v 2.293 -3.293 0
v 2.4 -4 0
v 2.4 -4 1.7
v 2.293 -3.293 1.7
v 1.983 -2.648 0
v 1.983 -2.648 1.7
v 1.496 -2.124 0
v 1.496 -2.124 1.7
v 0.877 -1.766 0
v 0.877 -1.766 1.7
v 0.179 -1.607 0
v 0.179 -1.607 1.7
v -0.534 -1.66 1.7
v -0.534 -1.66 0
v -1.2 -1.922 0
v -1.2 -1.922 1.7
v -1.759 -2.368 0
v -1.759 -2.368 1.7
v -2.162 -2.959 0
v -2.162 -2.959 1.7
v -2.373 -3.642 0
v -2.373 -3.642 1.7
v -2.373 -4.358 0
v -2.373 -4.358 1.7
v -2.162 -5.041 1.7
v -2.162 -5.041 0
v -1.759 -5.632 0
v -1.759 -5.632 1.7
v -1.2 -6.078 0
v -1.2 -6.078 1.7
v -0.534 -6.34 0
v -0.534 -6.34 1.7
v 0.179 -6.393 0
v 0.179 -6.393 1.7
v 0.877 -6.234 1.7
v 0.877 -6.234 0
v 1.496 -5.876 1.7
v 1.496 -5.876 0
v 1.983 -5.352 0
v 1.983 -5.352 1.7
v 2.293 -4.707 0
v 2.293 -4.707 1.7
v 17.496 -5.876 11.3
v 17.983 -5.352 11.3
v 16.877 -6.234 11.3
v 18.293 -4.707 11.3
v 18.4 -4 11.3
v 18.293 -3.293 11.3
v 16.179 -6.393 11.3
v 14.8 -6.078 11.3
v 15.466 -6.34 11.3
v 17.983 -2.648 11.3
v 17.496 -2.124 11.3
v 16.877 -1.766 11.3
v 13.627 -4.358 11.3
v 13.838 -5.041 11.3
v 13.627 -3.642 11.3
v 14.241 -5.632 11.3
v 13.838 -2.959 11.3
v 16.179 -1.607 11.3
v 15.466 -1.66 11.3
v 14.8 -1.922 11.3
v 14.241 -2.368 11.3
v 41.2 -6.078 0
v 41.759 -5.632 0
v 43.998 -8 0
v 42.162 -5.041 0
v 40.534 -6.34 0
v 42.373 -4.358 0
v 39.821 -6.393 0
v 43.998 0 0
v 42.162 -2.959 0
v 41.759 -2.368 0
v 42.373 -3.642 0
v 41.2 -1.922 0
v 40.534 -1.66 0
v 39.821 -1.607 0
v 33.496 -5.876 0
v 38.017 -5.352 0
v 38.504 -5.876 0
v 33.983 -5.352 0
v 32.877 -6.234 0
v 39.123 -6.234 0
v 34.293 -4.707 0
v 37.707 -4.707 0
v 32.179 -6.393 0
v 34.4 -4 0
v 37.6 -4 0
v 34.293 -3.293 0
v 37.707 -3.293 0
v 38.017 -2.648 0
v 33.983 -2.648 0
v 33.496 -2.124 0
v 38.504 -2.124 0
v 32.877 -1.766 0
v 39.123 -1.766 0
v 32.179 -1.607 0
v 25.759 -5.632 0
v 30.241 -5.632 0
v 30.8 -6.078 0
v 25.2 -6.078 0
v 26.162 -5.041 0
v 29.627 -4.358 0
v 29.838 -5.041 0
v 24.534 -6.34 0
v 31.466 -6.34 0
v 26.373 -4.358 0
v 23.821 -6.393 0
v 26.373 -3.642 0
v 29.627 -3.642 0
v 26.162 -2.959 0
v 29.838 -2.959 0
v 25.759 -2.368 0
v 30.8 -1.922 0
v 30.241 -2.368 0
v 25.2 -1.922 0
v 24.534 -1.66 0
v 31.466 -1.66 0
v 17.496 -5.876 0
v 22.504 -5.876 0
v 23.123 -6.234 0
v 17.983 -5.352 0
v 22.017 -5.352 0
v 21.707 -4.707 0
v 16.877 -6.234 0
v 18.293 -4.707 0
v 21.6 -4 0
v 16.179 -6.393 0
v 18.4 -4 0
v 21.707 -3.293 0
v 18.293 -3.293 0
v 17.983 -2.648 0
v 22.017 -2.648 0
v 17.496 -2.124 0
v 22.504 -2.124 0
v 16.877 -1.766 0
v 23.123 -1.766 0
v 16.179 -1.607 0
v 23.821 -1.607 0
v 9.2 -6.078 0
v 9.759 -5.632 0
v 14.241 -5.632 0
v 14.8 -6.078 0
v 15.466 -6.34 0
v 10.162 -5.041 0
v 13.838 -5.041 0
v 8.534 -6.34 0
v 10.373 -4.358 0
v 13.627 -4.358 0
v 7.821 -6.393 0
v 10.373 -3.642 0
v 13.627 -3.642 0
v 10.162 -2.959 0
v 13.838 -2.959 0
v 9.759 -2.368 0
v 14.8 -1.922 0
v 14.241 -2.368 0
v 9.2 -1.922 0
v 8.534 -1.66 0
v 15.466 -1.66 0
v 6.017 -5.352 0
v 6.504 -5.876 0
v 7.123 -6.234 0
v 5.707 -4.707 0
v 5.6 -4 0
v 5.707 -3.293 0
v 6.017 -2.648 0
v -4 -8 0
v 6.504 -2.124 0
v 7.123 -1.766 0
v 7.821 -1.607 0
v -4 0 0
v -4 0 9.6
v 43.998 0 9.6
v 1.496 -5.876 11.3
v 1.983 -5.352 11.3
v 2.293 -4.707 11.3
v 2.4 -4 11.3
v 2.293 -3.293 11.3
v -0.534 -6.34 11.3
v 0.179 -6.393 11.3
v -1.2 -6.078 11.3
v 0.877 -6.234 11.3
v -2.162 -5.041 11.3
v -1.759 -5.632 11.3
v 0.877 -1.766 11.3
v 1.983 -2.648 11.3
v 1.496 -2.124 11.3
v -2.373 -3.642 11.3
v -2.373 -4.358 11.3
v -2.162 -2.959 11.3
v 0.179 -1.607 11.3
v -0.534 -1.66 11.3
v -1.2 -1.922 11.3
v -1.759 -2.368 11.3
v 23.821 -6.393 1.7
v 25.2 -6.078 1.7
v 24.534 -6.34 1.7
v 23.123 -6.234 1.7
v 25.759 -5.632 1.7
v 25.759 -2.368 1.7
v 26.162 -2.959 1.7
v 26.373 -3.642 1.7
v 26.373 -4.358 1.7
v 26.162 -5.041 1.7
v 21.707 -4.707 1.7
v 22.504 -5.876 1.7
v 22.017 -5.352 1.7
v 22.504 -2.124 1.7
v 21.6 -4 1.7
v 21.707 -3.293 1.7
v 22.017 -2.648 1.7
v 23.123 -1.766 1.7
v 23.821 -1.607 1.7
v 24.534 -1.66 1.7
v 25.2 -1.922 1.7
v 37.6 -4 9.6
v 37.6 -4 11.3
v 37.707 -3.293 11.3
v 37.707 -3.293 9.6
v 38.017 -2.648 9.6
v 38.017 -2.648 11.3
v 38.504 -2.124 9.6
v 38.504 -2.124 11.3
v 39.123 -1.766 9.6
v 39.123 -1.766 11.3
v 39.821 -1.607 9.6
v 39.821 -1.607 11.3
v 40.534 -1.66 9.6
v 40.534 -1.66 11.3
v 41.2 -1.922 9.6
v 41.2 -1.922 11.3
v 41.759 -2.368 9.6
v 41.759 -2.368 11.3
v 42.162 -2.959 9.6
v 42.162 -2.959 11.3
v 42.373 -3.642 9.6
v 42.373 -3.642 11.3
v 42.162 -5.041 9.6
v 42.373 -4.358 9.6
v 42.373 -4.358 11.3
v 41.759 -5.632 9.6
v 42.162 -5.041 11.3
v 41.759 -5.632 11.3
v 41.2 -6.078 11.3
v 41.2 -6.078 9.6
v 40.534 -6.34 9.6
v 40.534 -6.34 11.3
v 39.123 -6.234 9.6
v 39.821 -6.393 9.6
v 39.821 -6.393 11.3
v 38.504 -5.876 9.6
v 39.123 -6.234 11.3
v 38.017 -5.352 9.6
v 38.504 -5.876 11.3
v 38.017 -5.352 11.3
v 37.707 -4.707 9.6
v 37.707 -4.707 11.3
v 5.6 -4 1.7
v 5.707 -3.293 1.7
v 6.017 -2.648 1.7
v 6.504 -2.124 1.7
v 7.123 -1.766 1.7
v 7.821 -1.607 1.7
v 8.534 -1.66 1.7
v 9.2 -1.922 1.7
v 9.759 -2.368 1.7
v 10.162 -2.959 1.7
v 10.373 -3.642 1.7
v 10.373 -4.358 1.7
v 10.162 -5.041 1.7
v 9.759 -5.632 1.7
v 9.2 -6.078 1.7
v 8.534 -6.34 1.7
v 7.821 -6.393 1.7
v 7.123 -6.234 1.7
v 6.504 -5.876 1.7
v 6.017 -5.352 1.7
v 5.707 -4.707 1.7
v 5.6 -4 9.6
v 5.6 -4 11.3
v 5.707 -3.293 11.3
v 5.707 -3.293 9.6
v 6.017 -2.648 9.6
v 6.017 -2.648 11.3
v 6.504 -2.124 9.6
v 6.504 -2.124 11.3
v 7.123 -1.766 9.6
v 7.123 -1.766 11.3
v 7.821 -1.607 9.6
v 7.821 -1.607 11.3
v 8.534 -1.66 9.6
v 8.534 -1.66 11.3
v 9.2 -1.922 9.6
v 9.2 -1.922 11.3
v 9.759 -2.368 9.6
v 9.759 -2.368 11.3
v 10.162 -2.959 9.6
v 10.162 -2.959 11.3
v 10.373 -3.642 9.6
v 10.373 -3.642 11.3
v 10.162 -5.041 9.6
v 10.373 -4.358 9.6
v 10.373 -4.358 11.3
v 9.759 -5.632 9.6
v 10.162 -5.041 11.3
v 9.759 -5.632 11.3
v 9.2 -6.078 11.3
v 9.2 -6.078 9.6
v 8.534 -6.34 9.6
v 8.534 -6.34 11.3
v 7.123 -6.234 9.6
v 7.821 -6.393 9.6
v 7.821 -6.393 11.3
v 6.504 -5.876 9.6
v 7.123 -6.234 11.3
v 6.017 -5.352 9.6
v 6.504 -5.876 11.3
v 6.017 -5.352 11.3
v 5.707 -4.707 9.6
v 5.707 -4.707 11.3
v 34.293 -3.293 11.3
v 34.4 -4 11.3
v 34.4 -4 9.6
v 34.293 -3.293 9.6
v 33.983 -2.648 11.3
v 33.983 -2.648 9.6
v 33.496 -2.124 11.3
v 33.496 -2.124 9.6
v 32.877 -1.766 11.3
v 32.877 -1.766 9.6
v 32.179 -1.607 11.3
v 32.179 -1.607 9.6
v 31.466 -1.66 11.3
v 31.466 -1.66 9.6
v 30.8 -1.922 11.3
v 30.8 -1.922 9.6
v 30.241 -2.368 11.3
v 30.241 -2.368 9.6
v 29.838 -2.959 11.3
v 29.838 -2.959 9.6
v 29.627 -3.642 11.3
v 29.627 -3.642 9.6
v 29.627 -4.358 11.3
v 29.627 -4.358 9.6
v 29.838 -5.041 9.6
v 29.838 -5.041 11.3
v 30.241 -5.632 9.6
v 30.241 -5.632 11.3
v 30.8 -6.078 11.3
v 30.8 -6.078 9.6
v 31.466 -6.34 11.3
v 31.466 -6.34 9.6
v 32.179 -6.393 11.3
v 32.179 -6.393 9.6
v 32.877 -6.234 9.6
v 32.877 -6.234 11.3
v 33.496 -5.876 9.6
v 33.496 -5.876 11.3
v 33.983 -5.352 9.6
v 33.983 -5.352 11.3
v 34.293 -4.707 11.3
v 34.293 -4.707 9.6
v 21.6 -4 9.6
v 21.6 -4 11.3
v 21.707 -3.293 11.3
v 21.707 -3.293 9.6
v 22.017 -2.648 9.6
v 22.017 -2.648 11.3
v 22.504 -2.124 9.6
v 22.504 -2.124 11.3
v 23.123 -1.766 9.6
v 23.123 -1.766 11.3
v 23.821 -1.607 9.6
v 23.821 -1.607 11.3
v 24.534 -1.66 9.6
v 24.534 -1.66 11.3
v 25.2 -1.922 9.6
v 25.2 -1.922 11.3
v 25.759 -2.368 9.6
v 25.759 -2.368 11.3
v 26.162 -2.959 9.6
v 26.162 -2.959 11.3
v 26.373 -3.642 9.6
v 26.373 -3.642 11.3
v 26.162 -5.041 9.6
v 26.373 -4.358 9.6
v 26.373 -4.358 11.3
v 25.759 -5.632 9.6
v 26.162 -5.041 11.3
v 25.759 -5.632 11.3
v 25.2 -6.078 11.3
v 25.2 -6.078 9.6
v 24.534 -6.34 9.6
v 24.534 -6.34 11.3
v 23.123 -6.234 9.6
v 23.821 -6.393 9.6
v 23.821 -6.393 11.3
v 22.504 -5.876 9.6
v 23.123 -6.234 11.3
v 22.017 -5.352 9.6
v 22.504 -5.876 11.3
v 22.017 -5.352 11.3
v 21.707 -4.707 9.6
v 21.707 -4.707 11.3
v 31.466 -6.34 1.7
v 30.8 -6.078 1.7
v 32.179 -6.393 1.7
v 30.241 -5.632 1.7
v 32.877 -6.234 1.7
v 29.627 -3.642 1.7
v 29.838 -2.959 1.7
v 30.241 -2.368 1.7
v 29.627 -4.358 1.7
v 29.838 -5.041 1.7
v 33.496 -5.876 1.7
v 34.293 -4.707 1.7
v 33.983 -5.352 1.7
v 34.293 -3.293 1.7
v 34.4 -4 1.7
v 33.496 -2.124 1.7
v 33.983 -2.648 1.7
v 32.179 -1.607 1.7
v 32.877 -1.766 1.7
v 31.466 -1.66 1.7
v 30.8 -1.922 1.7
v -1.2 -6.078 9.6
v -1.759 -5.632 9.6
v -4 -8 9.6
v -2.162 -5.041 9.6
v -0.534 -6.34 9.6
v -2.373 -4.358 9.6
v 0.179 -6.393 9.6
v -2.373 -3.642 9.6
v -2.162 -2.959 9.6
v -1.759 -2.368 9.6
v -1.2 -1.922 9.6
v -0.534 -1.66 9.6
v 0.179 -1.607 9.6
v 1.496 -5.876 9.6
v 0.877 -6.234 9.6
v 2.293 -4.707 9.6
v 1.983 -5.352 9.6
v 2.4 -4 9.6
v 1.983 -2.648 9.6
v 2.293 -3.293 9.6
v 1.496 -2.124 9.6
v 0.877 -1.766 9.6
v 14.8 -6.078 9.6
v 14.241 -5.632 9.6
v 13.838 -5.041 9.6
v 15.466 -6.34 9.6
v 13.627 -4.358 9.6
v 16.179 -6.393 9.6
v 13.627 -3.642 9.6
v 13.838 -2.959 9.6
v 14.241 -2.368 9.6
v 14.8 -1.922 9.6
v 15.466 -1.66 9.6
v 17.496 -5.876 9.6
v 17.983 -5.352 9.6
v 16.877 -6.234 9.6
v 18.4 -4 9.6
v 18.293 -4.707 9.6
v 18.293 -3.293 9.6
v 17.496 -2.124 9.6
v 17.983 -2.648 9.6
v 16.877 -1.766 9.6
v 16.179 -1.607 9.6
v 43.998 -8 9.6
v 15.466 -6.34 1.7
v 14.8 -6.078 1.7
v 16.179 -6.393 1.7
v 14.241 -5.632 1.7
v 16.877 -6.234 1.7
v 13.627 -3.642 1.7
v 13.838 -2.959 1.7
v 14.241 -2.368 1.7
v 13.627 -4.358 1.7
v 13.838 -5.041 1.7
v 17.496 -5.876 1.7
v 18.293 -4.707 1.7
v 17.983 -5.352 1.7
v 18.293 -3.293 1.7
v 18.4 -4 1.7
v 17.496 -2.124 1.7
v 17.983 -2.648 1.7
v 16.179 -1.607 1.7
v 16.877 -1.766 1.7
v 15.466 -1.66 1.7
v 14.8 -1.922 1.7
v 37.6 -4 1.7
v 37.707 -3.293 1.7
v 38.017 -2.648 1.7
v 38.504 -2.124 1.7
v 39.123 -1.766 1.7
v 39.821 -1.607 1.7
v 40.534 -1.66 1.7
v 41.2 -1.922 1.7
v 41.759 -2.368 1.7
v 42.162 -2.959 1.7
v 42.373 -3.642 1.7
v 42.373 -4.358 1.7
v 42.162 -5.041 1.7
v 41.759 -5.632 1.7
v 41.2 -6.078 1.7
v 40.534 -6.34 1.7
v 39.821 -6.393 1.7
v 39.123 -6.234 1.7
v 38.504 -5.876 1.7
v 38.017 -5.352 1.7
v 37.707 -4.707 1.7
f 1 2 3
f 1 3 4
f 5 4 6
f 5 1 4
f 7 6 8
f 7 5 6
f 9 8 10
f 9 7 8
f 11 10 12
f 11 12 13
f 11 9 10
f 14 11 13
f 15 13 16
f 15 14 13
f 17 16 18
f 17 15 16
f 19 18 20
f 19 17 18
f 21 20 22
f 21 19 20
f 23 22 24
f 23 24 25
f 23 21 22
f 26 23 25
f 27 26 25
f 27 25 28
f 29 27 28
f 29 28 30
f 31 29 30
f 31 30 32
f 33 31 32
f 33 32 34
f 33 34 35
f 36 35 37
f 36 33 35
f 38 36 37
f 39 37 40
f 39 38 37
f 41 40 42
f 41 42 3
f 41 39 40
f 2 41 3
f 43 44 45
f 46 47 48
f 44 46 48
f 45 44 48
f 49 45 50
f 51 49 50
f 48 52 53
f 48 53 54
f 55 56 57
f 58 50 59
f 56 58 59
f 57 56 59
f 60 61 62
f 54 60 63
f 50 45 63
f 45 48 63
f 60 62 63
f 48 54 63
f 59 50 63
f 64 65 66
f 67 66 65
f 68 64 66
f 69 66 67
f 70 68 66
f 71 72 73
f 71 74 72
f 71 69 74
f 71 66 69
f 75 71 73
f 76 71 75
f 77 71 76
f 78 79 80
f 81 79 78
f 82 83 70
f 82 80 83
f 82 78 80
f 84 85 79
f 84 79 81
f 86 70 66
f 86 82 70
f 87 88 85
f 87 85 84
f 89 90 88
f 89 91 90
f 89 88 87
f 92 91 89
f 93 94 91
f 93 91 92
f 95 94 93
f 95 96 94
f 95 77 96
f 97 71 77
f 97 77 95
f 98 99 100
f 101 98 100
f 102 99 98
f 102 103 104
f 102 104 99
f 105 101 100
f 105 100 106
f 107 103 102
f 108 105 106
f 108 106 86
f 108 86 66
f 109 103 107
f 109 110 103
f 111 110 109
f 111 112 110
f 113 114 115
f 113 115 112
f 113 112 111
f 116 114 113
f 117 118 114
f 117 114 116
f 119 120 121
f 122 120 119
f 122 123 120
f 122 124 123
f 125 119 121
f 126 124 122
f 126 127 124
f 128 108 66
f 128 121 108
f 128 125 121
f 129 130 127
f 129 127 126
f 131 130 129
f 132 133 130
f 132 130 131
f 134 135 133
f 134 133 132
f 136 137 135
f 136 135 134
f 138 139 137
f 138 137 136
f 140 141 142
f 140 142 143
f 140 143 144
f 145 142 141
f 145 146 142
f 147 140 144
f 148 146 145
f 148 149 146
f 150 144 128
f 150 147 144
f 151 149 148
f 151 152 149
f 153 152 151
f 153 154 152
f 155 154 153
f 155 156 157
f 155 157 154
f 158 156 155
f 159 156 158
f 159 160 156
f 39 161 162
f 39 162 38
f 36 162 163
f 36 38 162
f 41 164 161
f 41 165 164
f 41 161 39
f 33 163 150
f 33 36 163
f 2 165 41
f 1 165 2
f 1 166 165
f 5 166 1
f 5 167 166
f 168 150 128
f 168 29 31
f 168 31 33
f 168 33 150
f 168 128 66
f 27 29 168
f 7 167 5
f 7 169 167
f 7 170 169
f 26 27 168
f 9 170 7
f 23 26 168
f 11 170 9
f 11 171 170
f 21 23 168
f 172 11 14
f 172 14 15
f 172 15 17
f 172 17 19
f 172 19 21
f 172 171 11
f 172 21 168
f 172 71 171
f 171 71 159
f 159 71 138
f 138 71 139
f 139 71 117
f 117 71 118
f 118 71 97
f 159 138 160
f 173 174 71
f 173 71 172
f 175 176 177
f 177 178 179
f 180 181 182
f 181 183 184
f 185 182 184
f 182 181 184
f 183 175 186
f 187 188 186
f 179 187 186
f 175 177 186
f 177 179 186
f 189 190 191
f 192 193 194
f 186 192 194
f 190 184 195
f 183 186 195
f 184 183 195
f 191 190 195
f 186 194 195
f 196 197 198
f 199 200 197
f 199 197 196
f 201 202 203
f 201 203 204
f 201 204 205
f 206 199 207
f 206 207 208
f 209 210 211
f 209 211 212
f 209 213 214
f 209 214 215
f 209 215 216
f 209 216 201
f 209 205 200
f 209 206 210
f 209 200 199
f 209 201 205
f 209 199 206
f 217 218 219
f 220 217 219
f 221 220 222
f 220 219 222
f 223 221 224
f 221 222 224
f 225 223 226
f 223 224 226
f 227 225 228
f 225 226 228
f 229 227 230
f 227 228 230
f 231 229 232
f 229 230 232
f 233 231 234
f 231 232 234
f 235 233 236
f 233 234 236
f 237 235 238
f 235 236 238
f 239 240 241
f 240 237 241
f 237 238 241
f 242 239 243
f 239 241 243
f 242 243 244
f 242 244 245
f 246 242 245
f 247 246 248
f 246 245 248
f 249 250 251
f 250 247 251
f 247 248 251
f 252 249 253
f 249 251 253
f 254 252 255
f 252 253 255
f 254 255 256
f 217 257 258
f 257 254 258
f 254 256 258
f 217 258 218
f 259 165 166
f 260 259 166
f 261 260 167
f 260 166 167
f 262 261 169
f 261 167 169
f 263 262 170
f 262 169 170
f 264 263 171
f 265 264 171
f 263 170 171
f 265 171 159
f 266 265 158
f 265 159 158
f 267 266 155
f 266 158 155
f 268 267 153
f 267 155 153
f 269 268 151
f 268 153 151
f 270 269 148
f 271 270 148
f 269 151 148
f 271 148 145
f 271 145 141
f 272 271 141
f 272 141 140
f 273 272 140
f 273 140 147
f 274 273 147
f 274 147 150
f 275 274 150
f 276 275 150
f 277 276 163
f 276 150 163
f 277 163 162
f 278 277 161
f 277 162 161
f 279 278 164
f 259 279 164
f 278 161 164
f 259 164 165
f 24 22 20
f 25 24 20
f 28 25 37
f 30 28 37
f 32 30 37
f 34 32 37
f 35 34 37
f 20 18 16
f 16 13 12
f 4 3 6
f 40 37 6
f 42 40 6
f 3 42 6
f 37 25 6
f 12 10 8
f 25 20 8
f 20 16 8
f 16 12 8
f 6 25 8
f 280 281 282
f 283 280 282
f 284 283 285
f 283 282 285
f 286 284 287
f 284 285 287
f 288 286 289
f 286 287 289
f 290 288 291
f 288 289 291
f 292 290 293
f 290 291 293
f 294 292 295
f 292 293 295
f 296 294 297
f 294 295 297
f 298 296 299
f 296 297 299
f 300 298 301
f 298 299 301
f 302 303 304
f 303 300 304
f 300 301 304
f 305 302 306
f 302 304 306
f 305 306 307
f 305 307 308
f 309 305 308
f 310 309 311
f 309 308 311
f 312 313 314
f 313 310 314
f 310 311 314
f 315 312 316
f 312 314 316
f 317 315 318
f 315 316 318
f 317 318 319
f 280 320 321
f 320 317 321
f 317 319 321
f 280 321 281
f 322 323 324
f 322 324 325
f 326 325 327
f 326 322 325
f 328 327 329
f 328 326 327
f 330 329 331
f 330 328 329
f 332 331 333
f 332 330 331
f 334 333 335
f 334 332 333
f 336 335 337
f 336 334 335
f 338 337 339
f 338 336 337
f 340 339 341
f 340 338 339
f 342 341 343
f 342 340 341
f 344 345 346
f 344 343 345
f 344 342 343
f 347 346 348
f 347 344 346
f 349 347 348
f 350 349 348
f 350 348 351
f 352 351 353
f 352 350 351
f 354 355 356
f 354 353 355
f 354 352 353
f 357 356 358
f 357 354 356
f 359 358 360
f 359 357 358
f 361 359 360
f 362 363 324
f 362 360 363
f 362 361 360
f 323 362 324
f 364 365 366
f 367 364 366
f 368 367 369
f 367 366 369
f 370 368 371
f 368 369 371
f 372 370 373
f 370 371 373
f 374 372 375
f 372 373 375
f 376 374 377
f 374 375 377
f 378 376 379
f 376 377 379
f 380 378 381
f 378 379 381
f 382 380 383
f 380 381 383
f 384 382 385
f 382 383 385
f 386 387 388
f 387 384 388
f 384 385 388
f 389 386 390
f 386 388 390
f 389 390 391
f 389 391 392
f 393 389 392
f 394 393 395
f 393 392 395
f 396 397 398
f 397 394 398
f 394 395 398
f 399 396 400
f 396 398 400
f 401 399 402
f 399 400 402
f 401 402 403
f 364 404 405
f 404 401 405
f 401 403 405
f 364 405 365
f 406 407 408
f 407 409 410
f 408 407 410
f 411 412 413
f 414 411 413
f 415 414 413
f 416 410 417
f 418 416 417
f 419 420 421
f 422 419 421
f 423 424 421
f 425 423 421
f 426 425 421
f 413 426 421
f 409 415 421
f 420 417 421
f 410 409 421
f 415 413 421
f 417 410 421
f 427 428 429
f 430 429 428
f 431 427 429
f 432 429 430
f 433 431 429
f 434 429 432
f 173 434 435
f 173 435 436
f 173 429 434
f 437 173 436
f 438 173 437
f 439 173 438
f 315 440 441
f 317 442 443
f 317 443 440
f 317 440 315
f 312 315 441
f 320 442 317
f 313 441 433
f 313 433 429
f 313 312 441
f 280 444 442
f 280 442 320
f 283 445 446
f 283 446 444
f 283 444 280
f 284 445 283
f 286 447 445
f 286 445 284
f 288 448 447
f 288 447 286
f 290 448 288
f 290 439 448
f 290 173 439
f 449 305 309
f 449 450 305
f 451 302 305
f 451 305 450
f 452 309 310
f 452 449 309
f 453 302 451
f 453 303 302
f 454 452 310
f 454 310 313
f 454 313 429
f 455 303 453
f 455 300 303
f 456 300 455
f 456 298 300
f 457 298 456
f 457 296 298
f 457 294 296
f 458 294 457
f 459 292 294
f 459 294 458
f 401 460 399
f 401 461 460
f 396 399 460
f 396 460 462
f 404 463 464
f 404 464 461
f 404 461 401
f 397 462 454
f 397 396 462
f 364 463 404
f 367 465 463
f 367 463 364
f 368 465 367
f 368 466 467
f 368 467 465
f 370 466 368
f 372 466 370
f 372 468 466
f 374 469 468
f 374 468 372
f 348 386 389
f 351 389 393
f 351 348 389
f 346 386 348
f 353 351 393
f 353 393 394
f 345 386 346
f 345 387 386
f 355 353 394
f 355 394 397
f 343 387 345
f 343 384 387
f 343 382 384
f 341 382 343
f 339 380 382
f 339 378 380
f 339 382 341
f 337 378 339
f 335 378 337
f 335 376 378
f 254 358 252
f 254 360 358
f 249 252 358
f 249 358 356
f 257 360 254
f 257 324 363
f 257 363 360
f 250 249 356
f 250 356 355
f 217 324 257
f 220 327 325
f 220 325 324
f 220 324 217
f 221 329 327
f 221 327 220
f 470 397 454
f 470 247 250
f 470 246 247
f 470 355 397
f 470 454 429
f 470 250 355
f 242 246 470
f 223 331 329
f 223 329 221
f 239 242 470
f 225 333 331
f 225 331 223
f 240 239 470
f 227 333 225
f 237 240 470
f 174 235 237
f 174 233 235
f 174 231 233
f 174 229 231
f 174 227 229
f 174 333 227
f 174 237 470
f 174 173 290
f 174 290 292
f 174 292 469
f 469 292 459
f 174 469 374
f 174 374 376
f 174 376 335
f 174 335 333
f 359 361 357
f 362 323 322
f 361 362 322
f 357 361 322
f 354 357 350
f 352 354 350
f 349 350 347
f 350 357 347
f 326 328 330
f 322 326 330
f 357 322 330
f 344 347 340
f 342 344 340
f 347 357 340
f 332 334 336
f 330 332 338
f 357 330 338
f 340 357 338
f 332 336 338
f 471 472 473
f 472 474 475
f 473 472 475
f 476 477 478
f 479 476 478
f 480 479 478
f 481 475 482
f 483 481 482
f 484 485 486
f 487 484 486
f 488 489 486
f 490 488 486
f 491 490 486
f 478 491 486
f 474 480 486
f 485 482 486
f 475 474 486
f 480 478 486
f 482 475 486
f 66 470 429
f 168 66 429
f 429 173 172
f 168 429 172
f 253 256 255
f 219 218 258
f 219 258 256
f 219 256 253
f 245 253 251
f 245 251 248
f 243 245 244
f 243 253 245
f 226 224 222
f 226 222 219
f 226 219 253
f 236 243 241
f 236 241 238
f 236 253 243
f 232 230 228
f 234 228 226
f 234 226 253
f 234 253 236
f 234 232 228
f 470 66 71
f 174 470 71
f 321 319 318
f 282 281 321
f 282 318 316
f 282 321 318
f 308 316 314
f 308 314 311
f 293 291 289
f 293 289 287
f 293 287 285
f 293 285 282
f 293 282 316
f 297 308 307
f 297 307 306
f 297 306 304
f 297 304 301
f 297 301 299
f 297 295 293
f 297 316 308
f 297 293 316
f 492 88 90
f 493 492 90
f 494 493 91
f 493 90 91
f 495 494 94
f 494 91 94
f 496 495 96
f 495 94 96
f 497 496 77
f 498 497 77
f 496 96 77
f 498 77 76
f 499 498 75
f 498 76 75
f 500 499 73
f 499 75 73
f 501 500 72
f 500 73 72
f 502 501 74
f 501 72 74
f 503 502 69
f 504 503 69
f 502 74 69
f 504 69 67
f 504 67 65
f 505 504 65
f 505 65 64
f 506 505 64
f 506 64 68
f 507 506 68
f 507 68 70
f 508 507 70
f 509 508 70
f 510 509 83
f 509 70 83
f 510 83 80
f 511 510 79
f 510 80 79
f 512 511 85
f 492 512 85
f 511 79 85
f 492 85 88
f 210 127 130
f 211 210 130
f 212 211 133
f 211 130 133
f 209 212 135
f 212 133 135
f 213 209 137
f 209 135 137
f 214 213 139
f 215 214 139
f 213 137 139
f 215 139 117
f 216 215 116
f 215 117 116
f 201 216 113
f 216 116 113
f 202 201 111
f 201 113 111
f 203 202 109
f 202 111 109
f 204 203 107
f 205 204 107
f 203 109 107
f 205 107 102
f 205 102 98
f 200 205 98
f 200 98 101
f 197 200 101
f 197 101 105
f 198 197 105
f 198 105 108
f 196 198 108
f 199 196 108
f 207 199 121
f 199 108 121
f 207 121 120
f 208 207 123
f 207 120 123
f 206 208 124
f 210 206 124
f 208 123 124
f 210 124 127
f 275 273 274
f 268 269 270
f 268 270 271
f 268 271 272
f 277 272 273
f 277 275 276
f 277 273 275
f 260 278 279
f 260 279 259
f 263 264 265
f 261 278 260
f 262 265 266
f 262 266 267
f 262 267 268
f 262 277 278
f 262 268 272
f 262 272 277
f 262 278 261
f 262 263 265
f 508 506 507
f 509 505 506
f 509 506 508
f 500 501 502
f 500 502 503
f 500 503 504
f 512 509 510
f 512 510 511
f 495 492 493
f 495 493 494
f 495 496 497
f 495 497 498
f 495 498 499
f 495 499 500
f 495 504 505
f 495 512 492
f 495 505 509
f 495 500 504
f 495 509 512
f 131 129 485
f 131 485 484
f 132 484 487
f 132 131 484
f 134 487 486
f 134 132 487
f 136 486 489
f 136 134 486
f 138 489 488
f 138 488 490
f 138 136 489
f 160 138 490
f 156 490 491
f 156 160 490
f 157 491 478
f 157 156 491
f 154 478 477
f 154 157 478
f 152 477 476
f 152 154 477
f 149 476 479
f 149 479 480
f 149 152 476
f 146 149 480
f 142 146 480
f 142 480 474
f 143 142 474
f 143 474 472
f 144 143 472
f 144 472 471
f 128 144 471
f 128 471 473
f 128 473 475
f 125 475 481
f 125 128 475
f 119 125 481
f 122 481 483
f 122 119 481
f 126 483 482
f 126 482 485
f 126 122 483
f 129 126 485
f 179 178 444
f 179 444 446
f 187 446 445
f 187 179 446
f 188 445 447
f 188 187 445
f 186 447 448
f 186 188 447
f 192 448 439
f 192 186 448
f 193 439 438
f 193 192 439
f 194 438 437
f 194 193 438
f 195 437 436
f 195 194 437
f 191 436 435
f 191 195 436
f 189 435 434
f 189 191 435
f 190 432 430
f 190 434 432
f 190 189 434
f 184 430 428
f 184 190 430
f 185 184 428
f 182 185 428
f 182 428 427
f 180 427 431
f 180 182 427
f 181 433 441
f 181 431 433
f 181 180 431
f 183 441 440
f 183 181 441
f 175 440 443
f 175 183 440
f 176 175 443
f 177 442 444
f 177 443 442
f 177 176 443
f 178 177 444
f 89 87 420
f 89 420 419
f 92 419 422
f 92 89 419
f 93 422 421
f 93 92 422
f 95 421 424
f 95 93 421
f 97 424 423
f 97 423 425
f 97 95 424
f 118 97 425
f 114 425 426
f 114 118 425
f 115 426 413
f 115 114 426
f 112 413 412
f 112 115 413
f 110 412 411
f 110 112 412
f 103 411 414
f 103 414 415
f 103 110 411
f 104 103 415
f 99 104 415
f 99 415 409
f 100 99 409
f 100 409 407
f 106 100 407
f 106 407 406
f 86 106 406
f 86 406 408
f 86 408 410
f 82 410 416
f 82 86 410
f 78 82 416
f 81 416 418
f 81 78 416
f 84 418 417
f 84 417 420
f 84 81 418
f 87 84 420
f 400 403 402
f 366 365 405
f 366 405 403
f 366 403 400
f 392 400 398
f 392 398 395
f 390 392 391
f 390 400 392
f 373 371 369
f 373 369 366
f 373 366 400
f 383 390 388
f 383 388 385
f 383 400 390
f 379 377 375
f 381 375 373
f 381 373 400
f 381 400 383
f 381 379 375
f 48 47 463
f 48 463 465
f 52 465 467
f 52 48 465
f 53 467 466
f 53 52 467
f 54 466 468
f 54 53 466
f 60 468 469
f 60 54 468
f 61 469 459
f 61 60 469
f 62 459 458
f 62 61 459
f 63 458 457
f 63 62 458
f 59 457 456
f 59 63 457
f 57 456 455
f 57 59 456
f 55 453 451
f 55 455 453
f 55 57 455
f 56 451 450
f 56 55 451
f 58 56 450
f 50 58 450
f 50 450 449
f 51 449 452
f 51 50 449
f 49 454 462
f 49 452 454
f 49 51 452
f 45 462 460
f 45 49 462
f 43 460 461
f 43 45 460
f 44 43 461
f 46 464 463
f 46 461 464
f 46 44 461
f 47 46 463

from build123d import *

# Parameters (mm, degrees)
F1_DEPTH  = 8
F3_W      = 8
F3_H      = 8
F3_R      = 2.4
F4_DEPTH  = 1.7
F5_R      = 2.4
F6_DEPTH  = 1.7
F13_W     = 22.9428485036
F13_H     = 31.0530802235
F14_DEPTH = 16.002


with BuildPart() as f1:
    # F0 (on Front) → F1 (new body)
    with BuildSketch(Plane.XZ):
        Polygon((-2.4, 9.6), (-4, 9.6), (-4, 0), (4, 0), (4, 9.6), (2.4, 9.6), (2.4, 11.3), (-2.4, 11.3), align=None)
    extrude(amount=F1_DEPTH)

    # F3 (on plane+point) → F4 (cut, through all)
    with BuildSketch(Plane.XY.offset(11.3)):
        with Locations((0, -4)):
            Rectangle(F3_W, F3_H)
        with Locations((0, -4)):
            Circle(F3_R, mode=Mode.SUBTRACT)
    extrude(amount=-F4_DEPTH, mode=Mode.SUBTRACT)

    # F5 (on Top) → F6 (cut)
    with BuildSketch(Plane.XY):
        with Locations((0, -4)):
            Circle(F5_R)
    extrude(amount=F6_DEPTH, mode=Mode.SUBTRACT)

    # F8: F1 across plane


with BuildPart() as f1_1:
    add(f1.part)
    add(f1.part.mirror(Plane.YZ.offset(4)))

    # F10: F1 across plane


with BuildPart() as f1_2:
    add(f1_1.part)
    add(f1_1.part.mirror(Plane.YZ.offset(12)))

    # F12: F1 across plane


with BuildPart() as f1_3:
    add(f1_2.part)
    add(f1_2.part.mirror(Plane.YZ.offset(28)))

    # F13 (on face) → F14 (cut)
    with BuildSketch(Plane.YZ.offset(60)):
        with Locations((-3.3198129386, 4.1634761728)):
            Rectangle(F13_W, F13_H)
    extrude(amount=-F14_DEPTH, mode=Mode.SUBTRACT)


solid = f1_3.part
